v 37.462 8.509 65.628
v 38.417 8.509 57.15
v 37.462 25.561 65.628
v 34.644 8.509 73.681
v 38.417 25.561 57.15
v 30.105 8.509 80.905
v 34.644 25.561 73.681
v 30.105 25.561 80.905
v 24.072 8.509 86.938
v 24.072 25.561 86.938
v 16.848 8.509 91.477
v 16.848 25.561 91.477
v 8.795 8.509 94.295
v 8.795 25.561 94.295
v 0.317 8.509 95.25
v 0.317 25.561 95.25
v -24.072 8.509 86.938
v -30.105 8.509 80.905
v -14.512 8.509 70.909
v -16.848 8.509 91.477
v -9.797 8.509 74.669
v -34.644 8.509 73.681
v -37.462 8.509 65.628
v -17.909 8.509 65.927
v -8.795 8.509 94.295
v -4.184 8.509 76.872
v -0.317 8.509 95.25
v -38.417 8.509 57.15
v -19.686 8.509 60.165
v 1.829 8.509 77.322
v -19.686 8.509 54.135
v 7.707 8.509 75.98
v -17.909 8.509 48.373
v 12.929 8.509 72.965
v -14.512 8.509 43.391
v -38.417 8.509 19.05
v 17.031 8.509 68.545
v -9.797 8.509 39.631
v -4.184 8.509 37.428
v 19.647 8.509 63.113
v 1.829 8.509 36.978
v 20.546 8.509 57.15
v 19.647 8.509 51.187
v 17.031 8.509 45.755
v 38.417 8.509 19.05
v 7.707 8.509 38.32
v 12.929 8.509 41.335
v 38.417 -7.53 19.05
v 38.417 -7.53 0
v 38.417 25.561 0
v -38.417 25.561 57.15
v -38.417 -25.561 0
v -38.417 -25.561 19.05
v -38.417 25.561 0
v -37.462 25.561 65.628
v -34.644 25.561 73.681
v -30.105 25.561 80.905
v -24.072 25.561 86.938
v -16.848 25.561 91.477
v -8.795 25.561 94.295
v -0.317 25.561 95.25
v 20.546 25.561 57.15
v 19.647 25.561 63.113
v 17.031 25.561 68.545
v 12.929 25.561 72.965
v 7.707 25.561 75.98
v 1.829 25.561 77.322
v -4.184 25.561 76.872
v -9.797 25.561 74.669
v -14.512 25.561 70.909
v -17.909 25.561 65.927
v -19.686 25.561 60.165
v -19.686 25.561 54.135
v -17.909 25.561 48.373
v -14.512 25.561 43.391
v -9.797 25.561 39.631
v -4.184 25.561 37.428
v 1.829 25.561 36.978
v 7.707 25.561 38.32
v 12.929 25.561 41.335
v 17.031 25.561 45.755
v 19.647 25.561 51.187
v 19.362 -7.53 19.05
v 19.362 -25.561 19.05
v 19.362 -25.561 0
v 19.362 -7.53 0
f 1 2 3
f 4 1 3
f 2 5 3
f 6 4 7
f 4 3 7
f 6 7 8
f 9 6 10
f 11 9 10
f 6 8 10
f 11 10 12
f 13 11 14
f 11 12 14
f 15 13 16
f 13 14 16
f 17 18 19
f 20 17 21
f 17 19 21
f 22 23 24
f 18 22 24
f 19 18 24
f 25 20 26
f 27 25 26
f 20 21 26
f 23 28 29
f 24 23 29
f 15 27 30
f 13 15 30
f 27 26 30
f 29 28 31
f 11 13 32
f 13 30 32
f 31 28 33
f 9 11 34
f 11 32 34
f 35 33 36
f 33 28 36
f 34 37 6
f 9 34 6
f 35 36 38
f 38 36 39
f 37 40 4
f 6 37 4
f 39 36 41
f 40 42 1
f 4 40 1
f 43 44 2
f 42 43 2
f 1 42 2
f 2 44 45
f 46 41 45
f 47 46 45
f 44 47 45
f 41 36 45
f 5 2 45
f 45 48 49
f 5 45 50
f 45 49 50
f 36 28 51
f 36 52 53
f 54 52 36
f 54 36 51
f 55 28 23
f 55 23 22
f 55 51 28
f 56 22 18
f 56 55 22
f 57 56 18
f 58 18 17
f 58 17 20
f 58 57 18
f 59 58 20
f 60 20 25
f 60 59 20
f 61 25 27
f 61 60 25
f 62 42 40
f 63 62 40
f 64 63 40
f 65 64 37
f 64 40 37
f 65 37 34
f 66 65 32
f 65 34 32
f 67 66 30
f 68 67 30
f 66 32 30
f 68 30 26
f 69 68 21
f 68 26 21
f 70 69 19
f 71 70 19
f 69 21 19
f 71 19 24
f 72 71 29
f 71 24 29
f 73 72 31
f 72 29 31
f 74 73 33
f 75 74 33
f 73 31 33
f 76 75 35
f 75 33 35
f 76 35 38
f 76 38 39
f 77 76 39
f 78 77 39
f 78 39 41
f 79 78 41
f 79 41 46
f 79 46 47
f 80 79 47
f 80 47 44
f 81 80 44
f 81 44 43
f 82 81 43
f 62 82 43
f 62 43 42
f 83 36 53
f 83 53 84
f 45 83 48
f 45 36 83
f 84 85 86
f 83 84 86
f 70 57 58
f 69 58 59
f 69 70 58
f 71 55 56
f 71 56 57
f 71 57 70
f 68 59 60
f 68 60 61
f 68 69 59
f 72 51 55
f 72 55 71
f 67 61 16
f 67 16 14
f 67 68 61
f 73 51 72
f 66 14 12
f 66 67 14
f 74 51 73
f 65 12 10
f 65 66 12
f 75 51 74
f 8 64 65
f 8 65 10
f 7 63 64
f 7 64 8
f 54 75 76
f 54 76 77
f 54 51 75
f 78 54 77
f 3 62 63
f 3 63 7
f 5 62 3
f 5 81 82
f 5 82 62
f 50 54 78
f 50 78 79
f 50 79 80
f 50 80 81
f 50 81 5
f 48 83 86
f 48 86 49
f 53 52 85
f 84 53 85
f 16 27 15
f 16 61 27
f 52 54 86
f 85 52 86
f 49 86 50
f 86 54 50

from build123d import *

# Parameters (mm, degrees)
F0_W     = 76.8338
F0_H     = 51.121704
F1_DEPTH = 19.05
F2_W     = 19.054732
F2_H     = 18.031149
F3_DEPTH = 22.606
F4_W     = 76.8338
F4_H     = 17.051882
F5_DEPTH = 76.2
F6_R     = 38.1
F7_R     = 20.228721
F8_DEPTH = 25.4


with BuildPart() as f1:
    # F0 (on Top) → F1 (new body)
    with BuildSketch(Plane.XY):
        Rectangle(F0_W, F0_H)
    extrude(amount=F1_DEPTH)

    # F2 (on face) → F3 (cut)
    with BuildSketch(Plane.XY.offset(19.05)):
        with Locations((28.889534, -16.545278)):
            Rectangle(F2_W, F2_H)
    extrude(amount=-F3_DEPTH, mode=Mode.SUBTRACT)

    # F4 (on face) → F5 (join)
    with BuildSketch(Plane.XY.offset(19.05)):
        with Locations((0, 17.034911)):
            Rectangle(F4_W, F4_H)
    extrude(amount=F5_DEPTH)

    # F6
    f6_edges = [f1.edges().sort_by_distance(p)[0] for p in [
        (-38.4169, 17.034911, 95.25),
        (38.4169, 17.034911, 95.25),
    ]]
    fillet(f6_edges, radius=F6_R)

    # F7 (on face) → F8 (cut)
    with BuildSketch(Plane.XZ.offset(-8.50897)):
        with Locations((0.3169, 57.15)):
            Circle(F7_R)
    extrude(amount=-F8_DEPTH, mode=Mode.SUBTRACT)


solid = f1.part
